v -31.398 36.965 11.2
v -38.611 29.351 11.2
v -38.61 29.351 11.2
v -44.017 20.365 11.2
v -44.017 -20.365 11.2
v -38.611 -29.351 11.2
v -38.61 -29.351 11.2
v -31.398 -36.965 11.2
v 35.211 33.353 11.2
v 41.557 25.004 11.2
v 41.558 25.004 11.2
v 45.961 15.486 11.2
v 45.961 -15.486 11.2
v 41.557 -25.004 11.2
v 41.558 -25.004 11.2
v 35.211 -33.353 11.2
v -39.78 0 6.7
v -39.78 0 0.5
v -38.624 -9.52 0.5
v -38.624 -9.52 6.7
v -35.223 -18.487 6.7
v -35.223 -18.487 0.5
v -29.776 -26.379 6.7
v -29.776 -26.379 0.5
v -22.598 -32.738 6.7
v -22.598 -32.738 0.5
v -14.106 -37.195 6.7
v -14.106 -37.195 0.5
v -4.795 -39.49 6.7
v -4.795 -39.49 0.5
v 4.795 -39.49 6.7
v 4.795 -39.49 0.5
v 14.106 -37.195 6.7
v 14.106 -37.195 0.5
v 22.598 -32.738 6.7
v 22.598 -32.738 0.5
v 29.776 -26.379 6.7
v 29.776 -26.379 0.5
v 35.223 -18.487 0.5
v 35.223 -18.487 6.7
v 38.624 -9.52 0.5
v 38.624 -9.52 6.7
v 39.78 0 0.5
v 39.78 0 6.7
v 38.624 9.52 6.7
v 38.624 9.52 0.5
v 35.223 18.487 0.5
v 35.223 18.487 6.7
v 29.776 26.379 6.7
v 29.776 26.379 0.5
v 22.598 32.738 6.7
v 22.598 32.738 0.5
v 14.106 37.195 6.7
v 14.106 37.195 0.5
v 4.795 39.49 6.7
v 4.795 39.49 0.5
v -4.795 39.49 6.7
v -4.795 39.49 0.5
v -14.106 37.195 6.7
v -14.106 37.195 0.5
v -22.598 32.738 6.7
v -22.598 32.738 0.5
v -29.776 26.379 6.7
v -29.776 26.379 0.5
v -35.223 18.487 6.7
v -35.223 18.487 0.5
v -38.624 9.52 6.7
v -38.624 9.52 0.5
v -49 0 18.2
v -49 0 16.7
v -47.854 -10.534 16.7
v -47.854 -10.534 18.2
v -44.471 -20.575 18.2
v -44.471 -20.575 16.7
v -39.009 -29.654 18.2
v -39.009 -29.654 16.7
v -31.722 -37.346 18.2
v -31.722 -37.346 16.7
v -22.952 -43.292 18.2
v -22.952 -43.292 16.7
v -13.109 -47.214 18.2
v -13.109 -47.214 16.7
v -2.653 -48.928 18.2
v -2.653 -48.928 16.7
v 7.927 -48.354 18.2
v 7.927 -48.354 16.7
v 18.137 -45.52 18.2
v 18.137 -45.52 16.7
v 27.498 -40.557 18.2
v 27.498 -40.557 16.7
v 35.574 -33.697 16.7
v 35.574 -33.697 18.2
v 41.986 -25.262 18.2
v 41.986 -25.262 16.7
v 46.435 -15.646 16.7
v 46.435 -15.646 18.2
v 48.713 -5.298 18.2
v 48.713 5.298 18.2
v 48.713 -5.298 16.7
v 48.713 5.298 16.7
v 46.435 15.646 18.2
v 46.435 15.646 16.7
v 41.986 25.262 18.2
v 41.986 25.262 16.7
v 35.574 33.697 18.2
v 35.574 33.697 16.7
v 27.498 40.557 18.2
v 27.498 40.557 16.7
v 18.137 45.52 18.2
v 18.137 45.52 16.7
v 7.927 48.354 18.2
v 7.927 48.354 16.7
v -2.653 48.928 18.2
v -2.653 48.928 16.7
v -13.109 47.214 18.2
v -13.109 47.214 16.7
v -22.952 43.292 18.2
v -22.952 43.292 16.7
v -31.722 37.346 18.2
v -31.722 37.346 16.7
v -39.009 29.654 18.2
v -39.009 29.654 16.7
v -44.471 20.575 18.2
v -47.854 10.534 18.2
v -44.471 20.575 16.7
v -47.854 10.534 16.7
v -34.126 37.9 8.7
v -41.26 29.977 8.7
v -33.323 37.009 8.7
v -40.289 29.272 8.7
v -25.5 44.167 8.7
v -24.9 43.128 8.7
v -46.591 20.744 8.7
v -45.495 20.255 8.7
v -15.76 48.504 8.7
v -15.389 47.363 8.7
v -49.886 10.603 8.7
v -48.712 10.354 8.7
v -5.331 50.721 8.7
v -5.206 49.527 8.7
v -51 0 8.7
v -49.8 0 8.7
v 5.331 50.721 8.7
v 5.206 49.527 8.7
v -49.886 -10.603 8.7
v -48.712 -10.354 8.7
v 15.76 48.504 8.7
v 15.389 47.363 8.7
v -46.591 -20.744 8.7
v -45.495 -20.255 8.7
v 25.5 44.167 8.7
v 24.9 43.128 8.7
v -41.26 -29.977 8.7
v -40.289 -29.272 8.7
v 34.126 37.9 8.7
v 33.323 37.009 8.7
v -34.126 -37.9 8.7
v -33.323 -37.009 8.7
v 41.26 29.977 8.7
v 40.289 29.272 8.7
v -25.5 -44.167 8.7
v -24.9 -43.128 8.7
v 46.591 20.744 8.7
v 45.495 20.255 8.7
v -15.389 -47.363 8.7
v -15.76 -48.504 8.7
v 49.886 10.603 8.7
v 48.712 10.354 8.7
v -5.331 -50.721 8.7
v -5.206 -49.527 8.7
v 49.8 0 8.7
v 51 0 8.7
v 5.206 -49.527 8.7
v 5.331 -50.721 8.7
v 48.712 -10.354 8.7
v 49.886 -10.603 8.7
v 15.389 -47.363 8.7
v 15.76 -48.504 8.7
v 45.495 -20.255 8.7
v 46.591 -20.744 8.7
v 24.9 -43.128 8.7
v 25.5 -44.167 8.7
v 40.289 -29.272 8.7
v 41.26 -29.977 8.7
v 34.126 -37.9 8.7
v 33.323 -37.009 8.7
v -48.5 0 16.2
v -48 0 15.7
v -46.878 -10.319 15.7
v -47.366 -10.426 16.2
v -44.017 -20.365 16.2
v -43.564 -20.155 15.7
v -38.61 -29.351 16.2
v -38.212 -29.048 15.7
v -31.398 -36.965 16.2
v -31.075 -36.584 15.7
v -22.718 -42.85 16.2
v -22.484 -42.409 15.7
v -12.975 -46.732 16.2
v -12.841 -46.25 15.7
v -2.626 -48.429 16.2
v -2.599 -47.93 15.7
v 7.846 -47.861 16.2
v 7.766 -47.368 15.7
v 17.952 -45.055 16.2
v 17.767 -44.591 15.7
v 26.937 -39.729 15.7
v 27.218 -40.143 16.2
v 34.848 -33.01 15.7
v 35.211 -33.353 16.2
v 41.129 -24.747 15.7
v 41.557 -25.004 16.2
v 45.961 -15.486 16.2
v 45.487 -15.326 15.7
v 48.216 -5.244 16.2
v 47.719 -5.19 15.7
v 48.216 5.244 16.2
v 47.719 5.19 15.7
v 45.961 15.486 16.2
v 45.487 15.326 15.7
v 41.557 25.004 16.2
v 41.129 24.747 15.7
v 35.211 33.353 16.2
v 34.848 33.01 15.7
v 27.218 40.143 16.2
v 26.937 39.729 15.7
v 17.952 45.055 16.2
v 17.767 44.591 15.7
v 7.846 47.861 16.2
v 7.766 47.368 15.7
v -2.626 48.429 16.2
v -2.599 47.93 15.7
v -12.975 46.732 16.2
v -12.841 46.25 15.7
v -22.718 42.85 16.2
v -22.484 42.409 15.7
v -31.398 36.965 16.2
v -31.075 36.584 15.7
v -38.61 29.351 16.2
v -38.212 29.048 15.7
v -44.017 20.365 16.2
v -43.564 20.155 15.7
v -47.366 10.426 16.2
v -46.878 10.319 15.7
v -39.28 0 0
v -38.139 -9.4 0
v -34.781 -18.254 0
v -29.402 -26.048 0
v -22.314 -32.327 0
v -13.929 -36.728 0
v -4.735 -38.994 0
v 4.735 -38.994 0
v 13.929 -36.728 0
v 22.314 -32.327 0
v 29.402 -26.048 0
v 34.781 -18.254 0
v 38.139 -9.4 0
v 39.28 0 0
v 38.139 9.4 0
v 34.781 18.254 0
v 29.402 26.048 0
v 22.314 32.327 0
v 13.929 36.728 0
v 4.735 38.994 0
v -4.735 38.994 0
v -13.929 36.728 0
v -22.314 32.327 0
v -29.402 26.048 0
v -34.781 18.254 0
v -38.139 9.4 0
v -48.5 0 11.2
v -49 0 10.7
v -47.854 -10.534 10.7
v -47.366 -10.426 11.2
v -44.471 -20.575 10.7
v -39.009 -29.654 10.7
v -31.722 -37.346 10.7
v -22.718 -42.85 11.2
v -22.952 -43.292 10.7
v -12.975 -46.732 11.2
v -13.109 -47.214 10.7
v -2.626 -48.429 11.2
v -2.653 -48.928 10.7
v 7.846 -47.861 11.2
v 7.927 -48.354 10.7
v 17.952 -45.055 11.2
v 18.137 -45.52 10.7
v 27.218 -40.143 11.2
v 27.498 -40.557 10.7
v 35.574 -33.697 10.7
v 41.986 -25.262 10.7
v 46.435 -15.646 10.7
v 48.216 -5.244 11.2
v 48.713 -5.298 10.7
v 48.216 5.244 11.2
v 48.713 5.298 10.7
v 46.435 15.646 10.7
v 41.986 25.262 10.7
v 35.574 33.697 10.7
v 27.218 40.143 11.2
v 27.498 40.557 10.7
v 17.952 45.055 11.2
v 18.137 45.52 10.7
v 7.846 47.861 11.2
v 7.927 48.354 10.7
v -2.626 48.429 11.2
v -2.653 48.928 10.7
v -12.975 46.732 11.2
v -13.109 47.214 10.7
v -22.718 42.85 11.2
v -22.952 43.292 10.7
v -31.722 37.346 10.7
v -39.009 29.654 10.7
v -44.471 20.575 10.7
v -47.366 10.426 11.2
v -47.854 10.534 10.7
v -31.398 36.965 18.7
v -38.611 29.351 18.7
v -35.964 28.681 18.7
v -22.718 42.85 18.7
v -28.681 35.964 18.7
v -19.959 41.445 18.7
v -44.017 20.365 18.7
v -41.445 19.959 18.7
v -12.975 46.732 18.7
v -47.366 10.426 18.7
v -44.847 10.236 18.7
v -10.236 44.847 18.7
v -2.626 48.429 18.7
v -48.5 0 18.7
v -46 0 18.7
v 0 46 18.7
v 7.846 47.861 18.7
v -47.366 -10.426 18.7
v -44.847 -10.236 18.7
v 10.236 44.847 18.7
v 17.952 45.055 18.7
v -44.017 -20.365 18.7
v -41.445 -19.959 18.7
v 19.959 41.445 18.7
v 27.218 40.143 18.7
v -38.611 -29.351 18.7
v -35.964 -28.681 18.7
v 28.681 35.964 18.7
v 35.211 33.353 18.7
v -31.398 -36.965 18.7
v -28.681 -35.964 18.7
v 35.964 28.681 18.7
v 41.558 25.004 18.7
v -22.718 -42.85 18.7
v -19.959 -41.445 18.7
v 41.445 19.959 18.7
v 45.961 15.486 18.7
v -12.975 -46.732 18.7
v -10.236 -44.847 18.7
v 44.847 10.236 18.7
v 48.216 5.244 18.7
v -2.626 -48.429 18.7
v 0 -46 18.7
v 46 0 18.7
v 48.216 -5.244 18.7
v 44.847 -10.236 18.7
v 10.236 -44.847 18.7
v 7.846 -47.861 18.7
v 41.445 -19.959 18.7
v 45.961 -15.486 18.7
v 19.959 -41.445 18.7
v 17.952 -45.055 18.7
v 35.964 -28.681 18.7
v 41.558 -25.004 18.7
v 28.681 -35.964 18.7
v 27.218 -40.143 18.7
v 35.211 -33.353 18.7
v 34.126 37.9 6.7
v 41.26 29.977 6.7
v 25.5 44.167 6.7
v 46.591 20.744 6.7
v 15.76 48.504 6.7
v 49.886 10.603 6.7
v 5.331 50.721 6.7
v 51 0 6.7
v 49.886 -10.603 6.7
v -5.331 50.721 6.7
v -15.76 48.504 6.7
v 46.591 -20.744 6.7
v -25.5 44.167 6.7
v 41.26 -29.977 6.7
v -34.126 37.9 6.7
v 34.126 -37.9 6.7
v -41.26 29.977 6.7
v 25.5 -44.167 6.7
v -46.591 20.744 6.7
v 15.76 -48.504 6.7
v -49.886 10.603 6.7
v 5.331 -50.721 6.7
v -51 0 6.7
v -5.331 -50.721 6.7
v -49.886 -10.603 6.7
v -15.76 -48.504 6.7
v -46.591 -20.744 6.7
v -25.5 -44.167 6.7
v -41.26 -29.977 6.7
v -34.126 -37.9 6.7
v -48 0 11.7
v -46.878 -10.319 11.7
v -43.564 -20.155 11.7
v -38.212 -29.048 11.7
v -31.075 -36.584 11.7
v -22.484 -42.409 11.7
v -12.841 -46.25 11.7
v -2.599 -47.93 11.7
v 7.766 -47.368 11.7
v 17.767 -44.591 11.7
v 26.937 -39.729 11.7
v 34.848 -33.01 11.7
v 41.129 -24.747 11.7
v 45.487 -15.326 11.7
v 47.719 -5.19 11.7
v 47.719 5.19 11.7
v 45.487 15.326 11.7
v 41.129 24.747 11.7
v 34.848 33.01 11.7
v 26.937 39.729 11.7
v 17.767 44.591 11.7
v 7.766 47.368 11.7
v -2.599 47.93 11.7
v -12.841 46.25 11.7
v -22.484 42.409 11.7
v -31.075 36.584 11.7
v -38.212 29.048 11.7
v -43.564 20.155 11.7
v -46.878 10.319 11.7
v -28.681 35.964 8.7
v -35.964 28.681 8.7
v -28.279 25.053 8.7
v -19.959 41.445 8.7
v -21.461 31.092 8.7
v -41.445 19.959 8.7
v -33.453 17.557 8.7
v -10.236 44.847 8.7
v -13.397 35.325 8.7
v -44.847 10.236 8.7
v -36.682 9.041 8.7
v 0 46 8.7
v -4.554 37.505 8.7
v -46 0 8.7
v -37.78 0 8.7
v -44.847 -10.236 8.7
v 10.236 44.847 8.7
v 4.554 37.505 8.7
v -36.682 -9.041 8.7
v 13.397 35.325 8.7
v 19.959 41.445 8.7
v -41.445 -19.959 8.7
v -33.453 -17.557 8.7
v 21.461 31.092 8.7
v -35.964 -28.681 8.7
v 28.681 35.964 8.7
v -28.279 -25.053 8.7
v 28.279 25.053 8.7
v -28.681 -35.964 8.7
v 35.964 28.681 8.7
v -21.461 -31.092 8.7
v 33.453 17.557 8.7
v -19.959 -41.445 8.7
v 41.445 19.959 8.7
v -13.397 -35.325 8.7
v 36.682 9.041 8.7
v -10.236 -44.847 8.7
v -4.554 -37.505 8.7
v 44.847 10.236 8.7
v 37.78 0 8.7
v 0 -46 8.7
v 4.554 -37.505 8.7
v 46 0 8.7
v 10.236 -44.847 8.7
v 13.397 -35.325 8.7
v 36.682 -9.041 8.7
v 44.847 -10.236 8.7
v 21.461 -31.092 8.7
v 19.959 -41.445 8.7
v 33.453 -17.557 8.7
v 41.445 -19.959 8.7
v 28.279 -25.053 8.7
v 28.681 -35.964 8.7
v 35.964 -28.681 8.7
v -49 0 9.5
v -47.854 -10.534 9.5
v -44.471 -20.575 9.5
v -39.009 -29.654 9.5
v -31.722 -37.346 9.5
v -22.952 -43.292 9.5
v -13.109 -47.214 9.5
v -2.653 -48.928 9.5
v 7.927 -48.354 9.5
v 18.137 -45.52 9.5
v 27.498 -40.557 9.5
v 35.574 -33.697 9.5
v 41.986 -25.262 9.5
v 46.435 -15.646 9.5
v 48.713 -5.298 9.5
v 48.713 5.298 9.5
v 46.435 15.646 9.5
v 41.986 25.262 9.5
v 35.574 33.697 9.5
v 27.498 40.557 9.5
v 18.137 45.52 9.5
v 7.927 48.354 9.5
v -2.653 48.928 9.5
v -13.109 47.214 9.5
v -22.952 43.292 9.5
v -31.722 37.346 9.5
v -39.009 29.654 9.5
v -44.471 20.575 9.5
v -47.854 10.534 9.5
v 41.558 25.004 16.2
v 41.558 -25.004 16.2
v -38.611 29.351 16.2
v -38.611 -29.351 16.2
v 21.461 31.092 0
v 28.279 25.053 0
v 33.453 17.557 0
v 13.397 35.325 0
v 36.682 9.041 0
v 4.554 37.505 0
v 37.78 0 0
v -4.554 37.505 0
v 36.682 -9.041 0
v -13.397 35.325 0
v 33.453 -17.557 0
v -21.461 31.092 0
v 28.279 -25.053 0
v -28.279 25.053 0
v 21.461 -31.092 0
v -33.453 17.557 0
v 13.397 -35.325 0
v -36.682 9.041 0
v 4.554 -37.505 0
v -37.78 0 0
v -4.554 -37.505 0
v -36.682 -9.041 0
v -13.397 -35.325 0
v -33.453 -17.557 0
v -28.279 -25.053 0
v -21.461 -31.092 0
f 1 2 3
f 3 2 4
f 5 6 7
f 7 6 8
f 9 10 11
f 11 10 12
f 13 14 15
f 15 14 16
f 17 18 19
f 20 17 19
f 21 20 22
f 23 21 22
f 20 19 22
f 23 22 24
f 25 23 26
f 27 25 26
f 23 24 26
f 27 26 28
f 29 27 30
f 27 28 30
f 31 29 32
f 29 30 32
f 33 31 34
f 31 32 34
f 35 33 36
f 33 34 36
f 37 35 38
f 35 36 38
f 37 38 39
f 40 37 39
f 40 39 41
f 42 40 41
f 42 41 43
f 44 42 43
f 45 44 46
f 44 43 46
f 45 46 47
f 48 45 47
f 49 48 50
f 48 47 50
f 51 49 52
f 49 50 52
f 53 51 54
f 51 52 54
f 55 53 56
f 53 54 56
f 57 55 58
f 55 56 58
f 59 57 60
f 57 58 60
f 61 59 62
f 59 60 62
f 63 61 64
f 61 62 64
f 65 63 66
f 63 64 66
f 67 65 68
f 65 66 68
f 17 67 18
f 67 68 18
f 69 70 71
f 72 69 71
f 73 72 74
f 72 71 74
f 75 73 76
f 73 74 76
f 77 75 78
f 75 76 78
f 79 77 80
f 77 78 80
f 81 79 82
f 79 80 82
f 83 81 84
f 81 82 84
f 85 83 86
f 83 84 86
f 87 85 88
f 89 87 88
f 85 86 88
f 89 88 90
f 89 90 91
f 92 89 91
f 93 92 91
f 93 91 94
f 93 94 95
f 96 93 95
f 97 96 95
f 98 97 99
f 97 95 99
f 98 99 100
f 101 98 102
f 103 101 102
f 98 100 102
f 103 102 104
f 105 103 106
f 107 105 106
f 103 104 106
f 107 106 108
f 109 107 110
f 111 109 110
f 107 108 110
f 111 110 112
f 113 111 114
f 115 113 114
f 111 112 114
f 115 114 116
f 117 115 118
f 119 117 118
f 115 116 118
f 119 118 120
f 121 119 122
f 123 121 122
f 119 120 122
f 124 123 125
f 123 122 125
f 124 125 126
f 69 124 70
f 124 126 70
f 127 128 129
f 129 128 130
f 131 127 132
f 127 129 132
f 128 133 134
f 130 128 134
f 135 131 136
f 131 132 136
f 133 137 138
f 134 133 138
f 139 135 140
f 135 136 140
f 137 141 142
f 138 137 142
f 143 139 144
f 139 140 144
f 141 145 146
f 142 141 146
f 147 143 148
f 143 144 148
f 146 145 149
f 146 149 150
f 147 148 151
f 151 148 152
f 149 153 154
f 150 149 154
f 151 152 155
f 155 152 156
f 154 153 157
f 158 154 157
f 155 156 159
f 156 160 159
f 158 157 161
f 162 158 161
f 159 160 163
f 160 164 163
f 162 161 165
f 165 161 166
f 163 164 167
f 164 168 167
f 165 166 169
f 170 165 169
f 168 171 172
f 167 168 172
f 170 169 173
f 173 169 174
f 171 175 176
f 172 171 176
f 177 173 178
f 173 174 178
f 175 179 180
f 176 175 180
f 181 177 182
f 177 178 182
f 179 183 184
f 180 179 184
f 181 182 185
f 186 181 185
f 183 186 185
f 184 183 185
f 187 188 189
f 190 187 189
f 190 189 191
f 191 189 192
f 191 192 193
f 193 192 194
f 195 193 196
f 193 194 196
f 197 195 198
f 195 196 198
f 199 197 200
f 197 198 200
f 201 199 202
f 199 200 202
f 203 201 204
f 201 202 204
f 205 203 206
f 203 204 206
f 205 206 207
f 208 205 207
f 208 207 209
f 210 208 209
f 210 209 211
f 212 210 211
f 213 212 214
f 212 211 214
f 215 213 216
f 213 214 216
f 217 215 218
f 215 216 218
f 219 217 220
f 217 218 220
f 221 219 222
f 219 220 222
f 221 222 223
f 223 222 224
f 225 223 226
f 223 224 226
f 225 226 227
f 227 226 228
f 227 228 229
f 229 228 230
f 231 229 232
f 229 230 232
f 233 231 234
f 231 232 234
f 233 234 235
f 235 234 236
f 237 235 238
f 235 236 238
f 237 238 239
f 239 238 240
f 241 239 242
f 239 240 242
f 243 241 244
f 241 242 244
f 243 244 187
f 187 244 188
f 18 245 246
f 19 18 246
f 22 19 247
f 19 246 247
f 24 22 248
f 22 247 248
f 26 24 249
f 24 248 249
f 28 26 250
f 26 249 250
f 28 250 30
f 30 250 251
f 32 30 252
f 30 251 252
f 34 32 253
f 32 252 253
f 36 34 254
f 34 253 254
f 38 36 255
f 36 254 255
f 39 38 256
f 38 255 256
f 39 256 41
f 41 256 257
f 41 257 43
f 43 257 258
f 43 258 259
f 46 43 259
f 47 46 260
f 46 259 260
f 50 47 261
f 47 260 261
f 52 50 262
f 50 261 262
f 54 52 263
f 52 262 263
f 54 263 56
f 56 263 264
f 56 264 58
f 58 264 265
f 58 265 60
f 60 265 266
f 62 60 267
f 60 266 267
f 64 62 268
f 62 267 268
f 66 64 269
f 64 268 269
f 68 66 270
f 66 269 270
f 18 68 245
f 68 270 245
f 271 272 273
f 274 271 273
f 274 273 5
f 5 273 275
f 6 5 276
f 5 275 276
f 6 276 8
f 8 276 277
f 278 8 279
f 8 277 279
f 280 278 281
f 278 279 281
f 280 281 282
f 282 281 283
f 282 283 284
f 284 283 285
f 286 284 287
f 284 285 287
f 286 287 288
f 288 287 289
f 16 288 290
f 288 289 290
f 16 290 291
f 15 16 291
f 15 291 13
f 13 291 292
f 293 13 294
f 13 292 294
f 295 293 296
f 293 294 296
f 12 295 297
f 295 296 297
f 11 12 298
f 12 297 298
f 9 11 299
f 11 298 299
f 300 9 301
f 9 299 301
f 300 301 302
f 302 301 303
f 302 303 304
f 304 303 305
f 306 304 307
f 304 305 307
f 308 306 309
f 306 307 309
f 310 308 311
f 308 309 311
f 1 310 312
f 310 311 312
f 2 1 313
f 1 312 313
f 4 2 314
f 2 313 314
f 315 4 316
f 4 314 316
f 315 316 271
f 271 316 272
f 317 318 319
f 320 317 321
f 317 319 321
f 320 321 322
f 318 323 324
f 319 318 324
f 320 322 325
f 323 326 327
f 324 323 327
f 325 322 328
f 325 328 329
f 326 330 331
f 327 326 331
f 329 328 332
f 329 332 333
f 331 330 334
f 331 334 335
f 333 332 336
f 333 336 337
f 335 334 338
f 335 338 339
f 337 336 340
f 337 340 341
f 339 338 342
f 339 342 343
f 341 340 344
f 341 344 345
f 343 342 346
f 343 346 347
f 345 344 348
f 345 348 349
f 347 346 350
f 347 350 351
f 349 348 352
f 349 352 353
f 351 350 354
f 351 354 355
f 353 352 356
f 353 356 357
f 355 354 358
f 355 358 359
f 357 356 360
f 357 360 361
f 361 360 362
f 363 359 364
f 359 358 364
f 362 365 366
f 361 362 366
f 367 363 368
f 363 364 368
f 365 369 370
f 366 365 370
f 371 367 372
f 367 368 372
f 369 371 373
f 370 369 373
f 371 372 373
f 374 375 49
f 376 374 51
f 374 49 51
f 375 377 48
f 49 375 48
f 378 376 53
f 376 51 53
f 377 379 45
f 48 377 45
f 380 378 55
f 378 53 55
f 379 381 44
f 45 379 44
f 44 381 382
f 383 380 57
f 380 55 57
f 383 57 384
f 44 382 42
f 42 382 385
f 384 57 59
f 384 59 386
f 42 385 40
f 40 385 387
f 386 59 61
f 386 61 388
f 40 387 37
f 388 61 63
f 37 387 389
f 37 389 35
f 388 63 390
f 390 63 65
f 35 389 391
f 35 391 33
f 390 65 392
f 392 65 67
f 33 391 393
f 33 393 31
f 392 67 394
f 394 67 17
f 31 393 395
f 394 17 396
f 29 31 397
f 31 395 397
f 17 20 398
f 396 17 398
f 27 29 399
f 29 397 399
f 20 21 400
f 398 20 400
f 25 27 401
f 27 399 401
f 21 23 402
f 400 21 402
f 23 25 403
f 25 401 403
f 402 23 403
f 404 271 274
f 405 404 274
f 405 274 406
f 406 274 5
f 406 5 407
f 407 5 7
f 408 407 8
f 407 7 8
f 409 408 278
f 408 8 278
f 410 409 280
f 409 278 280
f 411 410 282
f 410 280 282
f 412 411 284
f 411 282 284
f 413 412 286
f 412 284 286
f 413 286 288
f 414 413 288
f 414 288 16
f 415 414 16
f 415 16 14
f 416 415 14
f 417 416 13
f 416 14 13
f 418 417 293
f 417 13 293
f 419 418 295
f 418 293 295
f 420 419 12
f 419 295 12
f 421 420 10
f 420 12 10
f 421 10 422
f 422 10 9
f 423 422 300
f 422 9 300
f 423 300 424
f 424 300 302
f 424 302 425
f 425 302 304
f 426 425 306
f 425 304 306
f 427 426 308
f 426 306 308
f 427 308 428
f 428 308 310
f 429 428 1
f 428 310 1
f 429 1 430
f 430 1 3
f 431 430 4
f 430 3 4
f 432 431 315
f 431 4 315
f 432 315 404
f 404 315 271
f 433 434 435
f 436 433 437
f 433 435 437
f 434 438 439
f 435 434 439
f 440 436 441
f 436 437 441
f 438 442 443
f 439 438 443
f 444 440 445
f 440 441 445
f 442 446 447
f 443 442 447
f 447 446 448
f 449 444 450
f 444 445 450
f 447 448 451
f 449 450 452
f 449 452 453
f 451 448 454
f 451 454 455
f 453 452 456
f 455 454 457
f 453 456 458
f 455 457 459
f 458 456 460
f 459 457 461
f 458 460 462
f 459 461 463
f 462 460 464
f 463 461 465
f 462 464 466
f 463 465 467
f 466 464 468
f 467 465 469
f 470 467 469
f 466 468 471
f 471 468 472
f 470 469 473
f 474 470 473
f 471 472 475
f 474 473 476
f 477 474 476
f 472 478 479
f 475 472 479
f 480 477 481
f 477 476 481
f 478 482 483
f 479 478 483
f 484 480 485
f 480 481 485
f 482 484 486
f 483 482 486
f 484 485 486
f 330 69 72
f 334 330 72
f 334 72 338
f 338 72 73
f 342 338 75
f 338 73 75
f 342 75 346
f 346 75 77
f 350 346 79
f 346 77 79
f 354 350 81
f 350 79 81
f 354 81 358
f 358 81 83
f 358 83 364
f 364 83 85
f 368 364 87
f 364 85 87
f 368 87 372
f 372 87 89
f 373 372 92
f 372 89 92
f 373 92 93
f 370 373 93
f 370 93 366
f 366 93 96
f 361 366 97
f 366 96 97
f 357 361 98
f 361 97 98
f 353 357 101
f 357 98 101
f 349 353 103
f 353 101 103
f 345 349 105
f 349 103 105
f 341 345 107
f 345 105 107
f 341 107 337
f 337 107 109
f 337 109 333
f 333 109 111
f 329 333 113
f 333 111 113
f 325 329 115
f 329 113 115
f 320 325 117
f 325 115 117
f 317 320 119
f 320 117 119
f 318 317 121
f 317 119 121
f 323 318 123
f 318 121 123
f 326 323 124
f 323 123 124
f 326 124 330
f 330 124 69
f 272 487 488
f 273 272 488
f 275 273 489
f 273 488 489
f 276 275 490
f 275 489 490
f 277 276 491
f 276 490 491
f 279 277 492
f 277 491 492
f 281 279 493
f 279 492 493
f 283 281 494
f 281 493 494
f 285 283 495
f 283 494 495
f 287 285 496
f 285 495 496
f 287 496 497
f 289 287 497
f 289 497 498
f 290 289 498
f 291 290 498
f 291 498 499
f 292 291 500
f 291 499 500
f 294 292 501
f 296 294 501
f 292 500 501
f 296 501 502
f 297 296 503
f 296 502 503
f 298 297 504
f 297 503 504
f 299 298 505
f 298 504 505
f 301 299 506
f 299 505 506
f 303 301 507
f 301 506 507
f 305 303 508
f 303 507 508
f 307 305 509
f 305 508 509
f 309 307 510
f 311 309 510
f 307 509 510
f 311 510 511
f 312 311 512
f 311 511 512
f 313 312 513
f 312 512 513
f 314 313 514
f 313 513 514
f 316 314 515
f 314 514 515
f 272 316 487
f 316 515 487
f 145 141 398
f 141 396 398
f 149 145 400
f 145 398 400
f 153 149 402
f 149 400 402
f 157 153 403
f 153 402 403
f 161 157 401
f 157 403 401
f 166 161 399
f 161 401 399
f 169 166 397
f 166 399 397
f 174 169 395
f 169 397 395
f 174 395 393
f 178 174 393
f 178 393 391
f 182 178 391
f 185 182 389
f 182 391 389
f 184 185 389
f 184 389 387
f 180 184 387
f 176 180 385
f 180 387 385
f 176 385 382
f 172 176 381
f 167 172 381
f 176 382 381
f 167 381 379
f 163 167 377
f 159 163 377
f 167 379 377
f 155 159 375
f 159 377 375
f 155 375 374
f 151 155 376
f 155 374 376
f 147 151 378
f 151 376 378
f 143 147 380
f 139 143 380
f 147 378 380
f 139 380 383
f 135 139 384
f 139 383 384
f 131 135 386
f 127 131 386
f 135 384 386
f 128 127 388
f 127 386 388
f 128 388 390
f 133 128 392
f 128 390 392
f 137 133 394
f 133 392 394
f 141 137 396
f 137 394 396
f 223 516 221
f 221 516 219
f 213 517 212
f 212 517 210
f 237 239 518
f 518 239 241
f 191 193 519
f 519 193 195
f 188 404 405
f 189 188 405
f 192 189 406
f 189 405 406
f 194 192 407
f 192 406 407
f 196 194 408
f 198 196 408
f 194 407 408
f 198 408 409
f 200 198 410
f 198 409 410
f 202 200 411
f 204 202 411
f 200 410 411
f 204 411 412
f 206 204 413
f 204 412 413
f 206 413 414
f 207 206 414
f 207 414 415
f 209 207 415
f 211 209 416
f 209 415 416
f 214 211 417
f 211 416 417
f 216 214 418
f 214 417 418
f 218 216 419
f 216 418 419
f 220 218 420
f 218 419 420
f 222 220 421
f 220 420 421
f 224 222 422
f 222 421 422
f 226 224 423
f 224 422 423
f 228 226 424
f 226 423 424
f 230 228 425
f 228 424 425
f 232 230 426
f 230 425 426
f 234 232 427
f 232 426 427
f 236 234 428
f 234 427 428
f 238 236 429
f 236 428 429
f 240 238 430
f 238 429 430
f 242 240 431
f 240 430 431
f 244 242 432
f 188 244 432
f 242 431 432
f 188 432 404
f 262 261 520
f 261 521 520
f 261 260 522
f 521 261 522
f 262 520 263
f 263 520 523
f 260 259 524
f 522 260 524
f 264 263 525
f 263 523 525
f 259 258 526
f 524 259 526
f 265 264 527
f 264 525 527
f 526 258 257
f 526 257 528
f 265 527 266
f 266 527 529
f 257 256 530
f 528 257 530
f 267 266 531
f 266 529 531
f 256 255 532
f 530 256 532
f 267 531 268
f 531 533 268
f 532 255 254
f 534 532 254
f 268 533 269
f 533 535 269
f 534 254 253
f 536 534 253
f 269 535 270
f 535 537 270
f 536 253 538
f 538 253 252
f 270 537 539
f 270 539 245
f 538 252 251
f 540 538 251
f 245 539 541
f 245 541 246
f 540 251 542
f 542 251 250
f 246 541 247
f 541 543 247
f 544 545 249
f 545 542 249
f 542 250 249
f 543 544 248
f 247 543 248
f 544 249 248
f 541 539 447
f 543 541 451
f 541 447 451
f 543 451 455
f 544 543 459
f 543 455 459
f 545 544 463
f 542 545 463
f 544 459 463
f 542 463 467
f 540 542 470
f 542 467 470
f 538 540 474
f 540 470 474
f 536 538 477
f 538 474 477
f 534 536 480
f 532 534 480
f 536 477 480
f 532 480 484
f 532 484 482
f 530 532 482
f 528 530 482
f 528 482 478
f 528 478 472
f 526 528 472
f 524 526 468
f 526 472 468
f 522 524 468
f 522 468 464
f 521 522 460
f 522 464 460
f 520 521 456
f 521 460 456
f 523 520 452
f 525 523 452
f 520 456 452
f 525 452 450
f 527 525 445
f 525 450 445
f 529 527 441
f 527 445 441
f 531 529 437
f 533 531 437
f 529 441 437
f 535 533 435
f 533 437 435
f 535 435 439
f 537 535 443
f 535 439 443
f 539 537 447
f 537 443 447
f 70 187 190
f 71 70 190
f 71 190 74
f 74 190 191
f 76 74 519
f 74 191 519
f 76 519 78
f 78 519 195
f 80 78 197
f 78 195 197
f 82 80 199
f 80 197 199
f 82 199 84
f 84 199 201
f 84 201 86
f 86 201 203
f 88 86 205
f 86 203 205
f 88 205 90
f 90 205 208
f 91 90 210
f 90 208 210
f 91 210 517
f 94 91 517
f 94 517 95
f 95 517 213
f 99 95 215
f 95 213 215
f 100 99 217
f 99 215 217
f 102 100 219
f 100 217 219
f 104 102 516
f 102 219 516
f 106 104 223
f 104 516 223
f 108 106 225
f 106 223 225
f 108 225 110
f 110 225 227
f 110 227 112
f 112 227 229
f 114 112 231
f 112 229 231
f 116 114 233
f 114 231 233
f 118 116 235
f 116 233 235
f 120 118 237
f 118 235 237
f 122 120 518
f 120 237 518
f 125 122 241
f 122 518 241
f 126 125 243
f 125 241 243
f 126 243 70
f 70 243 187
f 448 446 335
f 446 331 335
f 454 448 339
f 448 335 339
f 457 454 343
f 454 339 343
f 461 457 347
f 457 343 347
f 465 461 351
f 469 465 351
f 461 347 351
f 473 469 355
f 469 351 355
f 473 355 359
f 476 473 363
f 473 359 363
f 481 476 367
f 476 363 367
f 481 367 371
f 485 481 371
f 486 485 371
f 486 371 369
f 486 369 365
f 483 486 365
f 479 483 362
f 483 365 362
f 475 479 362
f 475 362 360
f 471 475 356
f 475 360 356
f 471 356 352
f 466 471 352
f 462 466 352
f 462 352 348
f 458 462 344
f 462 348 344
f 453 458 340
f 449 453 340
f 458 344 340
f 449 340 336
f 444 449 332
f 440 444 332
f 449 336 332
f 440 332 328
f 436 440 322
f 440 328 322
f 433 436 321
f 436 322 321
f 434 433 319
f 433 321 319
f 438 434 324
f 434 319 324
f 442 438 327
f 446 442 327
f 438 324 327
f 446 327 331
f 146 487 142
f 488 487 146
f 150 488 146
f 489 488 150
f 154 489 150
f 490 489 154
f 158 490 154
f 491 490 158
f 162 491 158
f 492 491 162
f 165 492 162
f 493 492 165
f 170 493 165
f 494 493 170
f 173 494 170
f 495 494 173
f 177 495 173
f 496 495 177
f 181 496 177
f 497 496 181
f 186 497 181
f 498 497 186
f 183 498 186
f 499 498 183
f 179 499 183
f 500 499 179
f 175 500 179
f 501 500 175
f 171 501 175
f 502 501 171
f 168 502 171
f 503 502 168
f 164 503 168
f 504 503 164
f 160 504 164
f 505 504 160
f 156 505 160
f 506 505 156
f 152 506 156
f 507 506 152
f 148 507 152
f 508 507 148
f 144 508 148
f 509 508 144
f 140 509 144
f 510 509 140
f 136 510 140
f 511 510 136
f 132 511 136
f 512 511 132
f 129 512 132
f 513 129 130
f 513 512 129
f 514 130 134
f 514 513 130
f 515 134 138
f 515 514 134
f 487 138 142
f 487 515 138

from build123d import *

# Parameters (mm, degrees)
CHAMFER1_SIZE = 0.5
CHAMFER2_SIZE = 0.8


with BuildPart() as part:
    # Sketch1 → Revolve1 (revolve)
    with BuildSketch(Plane(origin=(0, 0, 0), x_dir=(1, 0, 0), z_dir=(0, 1, 0)), mode=Mode.PRIVATE) as revolve1_sk:
        Polygon((37.78, 0), (37.78, -8.7), (46, -8.7), (46, -18.7), (49, -18.7), (49, -16.2), (48, -16.2), (48, -11.2), (49, -11.2), (49, -8.7), (51, -8.7), (51, -6.7), (39.78, -6.7), (39.78, 0), align=None)
    revolve(revolve1_sk.sketch.rotate(Axis((0, 0, -73.981367368), (0, 0, 1)), 180), axis=Axis((0, 0, -73.981367368), (0, 0, 1)))

    # Chamfer1
    chamfer1_edges = [part.edges().sort_by_distance(p)[0] for p in [
        (49, 0, 11.2),
        (48, 0, 11.2),
        (48, 0, 16.2),
        (49, 0, 16.2),
        (49, 0, 18.7),
        (39.78, 0, 0),
    ]]
    chamfer(chamfer1_edges, length=CHAMFER1_SIZE - 0.0001)  # a hair under: the kernel refuses the full size

    # Chamfer2
    chamfer2_edges = [part.edges().sort_by_distance(p)[0] for p in [
        (49, 0, 8.7),
    ]]
    chamfer(chamfer2_edges, length=CHAMFER2_SIZE)


solid = part.part
